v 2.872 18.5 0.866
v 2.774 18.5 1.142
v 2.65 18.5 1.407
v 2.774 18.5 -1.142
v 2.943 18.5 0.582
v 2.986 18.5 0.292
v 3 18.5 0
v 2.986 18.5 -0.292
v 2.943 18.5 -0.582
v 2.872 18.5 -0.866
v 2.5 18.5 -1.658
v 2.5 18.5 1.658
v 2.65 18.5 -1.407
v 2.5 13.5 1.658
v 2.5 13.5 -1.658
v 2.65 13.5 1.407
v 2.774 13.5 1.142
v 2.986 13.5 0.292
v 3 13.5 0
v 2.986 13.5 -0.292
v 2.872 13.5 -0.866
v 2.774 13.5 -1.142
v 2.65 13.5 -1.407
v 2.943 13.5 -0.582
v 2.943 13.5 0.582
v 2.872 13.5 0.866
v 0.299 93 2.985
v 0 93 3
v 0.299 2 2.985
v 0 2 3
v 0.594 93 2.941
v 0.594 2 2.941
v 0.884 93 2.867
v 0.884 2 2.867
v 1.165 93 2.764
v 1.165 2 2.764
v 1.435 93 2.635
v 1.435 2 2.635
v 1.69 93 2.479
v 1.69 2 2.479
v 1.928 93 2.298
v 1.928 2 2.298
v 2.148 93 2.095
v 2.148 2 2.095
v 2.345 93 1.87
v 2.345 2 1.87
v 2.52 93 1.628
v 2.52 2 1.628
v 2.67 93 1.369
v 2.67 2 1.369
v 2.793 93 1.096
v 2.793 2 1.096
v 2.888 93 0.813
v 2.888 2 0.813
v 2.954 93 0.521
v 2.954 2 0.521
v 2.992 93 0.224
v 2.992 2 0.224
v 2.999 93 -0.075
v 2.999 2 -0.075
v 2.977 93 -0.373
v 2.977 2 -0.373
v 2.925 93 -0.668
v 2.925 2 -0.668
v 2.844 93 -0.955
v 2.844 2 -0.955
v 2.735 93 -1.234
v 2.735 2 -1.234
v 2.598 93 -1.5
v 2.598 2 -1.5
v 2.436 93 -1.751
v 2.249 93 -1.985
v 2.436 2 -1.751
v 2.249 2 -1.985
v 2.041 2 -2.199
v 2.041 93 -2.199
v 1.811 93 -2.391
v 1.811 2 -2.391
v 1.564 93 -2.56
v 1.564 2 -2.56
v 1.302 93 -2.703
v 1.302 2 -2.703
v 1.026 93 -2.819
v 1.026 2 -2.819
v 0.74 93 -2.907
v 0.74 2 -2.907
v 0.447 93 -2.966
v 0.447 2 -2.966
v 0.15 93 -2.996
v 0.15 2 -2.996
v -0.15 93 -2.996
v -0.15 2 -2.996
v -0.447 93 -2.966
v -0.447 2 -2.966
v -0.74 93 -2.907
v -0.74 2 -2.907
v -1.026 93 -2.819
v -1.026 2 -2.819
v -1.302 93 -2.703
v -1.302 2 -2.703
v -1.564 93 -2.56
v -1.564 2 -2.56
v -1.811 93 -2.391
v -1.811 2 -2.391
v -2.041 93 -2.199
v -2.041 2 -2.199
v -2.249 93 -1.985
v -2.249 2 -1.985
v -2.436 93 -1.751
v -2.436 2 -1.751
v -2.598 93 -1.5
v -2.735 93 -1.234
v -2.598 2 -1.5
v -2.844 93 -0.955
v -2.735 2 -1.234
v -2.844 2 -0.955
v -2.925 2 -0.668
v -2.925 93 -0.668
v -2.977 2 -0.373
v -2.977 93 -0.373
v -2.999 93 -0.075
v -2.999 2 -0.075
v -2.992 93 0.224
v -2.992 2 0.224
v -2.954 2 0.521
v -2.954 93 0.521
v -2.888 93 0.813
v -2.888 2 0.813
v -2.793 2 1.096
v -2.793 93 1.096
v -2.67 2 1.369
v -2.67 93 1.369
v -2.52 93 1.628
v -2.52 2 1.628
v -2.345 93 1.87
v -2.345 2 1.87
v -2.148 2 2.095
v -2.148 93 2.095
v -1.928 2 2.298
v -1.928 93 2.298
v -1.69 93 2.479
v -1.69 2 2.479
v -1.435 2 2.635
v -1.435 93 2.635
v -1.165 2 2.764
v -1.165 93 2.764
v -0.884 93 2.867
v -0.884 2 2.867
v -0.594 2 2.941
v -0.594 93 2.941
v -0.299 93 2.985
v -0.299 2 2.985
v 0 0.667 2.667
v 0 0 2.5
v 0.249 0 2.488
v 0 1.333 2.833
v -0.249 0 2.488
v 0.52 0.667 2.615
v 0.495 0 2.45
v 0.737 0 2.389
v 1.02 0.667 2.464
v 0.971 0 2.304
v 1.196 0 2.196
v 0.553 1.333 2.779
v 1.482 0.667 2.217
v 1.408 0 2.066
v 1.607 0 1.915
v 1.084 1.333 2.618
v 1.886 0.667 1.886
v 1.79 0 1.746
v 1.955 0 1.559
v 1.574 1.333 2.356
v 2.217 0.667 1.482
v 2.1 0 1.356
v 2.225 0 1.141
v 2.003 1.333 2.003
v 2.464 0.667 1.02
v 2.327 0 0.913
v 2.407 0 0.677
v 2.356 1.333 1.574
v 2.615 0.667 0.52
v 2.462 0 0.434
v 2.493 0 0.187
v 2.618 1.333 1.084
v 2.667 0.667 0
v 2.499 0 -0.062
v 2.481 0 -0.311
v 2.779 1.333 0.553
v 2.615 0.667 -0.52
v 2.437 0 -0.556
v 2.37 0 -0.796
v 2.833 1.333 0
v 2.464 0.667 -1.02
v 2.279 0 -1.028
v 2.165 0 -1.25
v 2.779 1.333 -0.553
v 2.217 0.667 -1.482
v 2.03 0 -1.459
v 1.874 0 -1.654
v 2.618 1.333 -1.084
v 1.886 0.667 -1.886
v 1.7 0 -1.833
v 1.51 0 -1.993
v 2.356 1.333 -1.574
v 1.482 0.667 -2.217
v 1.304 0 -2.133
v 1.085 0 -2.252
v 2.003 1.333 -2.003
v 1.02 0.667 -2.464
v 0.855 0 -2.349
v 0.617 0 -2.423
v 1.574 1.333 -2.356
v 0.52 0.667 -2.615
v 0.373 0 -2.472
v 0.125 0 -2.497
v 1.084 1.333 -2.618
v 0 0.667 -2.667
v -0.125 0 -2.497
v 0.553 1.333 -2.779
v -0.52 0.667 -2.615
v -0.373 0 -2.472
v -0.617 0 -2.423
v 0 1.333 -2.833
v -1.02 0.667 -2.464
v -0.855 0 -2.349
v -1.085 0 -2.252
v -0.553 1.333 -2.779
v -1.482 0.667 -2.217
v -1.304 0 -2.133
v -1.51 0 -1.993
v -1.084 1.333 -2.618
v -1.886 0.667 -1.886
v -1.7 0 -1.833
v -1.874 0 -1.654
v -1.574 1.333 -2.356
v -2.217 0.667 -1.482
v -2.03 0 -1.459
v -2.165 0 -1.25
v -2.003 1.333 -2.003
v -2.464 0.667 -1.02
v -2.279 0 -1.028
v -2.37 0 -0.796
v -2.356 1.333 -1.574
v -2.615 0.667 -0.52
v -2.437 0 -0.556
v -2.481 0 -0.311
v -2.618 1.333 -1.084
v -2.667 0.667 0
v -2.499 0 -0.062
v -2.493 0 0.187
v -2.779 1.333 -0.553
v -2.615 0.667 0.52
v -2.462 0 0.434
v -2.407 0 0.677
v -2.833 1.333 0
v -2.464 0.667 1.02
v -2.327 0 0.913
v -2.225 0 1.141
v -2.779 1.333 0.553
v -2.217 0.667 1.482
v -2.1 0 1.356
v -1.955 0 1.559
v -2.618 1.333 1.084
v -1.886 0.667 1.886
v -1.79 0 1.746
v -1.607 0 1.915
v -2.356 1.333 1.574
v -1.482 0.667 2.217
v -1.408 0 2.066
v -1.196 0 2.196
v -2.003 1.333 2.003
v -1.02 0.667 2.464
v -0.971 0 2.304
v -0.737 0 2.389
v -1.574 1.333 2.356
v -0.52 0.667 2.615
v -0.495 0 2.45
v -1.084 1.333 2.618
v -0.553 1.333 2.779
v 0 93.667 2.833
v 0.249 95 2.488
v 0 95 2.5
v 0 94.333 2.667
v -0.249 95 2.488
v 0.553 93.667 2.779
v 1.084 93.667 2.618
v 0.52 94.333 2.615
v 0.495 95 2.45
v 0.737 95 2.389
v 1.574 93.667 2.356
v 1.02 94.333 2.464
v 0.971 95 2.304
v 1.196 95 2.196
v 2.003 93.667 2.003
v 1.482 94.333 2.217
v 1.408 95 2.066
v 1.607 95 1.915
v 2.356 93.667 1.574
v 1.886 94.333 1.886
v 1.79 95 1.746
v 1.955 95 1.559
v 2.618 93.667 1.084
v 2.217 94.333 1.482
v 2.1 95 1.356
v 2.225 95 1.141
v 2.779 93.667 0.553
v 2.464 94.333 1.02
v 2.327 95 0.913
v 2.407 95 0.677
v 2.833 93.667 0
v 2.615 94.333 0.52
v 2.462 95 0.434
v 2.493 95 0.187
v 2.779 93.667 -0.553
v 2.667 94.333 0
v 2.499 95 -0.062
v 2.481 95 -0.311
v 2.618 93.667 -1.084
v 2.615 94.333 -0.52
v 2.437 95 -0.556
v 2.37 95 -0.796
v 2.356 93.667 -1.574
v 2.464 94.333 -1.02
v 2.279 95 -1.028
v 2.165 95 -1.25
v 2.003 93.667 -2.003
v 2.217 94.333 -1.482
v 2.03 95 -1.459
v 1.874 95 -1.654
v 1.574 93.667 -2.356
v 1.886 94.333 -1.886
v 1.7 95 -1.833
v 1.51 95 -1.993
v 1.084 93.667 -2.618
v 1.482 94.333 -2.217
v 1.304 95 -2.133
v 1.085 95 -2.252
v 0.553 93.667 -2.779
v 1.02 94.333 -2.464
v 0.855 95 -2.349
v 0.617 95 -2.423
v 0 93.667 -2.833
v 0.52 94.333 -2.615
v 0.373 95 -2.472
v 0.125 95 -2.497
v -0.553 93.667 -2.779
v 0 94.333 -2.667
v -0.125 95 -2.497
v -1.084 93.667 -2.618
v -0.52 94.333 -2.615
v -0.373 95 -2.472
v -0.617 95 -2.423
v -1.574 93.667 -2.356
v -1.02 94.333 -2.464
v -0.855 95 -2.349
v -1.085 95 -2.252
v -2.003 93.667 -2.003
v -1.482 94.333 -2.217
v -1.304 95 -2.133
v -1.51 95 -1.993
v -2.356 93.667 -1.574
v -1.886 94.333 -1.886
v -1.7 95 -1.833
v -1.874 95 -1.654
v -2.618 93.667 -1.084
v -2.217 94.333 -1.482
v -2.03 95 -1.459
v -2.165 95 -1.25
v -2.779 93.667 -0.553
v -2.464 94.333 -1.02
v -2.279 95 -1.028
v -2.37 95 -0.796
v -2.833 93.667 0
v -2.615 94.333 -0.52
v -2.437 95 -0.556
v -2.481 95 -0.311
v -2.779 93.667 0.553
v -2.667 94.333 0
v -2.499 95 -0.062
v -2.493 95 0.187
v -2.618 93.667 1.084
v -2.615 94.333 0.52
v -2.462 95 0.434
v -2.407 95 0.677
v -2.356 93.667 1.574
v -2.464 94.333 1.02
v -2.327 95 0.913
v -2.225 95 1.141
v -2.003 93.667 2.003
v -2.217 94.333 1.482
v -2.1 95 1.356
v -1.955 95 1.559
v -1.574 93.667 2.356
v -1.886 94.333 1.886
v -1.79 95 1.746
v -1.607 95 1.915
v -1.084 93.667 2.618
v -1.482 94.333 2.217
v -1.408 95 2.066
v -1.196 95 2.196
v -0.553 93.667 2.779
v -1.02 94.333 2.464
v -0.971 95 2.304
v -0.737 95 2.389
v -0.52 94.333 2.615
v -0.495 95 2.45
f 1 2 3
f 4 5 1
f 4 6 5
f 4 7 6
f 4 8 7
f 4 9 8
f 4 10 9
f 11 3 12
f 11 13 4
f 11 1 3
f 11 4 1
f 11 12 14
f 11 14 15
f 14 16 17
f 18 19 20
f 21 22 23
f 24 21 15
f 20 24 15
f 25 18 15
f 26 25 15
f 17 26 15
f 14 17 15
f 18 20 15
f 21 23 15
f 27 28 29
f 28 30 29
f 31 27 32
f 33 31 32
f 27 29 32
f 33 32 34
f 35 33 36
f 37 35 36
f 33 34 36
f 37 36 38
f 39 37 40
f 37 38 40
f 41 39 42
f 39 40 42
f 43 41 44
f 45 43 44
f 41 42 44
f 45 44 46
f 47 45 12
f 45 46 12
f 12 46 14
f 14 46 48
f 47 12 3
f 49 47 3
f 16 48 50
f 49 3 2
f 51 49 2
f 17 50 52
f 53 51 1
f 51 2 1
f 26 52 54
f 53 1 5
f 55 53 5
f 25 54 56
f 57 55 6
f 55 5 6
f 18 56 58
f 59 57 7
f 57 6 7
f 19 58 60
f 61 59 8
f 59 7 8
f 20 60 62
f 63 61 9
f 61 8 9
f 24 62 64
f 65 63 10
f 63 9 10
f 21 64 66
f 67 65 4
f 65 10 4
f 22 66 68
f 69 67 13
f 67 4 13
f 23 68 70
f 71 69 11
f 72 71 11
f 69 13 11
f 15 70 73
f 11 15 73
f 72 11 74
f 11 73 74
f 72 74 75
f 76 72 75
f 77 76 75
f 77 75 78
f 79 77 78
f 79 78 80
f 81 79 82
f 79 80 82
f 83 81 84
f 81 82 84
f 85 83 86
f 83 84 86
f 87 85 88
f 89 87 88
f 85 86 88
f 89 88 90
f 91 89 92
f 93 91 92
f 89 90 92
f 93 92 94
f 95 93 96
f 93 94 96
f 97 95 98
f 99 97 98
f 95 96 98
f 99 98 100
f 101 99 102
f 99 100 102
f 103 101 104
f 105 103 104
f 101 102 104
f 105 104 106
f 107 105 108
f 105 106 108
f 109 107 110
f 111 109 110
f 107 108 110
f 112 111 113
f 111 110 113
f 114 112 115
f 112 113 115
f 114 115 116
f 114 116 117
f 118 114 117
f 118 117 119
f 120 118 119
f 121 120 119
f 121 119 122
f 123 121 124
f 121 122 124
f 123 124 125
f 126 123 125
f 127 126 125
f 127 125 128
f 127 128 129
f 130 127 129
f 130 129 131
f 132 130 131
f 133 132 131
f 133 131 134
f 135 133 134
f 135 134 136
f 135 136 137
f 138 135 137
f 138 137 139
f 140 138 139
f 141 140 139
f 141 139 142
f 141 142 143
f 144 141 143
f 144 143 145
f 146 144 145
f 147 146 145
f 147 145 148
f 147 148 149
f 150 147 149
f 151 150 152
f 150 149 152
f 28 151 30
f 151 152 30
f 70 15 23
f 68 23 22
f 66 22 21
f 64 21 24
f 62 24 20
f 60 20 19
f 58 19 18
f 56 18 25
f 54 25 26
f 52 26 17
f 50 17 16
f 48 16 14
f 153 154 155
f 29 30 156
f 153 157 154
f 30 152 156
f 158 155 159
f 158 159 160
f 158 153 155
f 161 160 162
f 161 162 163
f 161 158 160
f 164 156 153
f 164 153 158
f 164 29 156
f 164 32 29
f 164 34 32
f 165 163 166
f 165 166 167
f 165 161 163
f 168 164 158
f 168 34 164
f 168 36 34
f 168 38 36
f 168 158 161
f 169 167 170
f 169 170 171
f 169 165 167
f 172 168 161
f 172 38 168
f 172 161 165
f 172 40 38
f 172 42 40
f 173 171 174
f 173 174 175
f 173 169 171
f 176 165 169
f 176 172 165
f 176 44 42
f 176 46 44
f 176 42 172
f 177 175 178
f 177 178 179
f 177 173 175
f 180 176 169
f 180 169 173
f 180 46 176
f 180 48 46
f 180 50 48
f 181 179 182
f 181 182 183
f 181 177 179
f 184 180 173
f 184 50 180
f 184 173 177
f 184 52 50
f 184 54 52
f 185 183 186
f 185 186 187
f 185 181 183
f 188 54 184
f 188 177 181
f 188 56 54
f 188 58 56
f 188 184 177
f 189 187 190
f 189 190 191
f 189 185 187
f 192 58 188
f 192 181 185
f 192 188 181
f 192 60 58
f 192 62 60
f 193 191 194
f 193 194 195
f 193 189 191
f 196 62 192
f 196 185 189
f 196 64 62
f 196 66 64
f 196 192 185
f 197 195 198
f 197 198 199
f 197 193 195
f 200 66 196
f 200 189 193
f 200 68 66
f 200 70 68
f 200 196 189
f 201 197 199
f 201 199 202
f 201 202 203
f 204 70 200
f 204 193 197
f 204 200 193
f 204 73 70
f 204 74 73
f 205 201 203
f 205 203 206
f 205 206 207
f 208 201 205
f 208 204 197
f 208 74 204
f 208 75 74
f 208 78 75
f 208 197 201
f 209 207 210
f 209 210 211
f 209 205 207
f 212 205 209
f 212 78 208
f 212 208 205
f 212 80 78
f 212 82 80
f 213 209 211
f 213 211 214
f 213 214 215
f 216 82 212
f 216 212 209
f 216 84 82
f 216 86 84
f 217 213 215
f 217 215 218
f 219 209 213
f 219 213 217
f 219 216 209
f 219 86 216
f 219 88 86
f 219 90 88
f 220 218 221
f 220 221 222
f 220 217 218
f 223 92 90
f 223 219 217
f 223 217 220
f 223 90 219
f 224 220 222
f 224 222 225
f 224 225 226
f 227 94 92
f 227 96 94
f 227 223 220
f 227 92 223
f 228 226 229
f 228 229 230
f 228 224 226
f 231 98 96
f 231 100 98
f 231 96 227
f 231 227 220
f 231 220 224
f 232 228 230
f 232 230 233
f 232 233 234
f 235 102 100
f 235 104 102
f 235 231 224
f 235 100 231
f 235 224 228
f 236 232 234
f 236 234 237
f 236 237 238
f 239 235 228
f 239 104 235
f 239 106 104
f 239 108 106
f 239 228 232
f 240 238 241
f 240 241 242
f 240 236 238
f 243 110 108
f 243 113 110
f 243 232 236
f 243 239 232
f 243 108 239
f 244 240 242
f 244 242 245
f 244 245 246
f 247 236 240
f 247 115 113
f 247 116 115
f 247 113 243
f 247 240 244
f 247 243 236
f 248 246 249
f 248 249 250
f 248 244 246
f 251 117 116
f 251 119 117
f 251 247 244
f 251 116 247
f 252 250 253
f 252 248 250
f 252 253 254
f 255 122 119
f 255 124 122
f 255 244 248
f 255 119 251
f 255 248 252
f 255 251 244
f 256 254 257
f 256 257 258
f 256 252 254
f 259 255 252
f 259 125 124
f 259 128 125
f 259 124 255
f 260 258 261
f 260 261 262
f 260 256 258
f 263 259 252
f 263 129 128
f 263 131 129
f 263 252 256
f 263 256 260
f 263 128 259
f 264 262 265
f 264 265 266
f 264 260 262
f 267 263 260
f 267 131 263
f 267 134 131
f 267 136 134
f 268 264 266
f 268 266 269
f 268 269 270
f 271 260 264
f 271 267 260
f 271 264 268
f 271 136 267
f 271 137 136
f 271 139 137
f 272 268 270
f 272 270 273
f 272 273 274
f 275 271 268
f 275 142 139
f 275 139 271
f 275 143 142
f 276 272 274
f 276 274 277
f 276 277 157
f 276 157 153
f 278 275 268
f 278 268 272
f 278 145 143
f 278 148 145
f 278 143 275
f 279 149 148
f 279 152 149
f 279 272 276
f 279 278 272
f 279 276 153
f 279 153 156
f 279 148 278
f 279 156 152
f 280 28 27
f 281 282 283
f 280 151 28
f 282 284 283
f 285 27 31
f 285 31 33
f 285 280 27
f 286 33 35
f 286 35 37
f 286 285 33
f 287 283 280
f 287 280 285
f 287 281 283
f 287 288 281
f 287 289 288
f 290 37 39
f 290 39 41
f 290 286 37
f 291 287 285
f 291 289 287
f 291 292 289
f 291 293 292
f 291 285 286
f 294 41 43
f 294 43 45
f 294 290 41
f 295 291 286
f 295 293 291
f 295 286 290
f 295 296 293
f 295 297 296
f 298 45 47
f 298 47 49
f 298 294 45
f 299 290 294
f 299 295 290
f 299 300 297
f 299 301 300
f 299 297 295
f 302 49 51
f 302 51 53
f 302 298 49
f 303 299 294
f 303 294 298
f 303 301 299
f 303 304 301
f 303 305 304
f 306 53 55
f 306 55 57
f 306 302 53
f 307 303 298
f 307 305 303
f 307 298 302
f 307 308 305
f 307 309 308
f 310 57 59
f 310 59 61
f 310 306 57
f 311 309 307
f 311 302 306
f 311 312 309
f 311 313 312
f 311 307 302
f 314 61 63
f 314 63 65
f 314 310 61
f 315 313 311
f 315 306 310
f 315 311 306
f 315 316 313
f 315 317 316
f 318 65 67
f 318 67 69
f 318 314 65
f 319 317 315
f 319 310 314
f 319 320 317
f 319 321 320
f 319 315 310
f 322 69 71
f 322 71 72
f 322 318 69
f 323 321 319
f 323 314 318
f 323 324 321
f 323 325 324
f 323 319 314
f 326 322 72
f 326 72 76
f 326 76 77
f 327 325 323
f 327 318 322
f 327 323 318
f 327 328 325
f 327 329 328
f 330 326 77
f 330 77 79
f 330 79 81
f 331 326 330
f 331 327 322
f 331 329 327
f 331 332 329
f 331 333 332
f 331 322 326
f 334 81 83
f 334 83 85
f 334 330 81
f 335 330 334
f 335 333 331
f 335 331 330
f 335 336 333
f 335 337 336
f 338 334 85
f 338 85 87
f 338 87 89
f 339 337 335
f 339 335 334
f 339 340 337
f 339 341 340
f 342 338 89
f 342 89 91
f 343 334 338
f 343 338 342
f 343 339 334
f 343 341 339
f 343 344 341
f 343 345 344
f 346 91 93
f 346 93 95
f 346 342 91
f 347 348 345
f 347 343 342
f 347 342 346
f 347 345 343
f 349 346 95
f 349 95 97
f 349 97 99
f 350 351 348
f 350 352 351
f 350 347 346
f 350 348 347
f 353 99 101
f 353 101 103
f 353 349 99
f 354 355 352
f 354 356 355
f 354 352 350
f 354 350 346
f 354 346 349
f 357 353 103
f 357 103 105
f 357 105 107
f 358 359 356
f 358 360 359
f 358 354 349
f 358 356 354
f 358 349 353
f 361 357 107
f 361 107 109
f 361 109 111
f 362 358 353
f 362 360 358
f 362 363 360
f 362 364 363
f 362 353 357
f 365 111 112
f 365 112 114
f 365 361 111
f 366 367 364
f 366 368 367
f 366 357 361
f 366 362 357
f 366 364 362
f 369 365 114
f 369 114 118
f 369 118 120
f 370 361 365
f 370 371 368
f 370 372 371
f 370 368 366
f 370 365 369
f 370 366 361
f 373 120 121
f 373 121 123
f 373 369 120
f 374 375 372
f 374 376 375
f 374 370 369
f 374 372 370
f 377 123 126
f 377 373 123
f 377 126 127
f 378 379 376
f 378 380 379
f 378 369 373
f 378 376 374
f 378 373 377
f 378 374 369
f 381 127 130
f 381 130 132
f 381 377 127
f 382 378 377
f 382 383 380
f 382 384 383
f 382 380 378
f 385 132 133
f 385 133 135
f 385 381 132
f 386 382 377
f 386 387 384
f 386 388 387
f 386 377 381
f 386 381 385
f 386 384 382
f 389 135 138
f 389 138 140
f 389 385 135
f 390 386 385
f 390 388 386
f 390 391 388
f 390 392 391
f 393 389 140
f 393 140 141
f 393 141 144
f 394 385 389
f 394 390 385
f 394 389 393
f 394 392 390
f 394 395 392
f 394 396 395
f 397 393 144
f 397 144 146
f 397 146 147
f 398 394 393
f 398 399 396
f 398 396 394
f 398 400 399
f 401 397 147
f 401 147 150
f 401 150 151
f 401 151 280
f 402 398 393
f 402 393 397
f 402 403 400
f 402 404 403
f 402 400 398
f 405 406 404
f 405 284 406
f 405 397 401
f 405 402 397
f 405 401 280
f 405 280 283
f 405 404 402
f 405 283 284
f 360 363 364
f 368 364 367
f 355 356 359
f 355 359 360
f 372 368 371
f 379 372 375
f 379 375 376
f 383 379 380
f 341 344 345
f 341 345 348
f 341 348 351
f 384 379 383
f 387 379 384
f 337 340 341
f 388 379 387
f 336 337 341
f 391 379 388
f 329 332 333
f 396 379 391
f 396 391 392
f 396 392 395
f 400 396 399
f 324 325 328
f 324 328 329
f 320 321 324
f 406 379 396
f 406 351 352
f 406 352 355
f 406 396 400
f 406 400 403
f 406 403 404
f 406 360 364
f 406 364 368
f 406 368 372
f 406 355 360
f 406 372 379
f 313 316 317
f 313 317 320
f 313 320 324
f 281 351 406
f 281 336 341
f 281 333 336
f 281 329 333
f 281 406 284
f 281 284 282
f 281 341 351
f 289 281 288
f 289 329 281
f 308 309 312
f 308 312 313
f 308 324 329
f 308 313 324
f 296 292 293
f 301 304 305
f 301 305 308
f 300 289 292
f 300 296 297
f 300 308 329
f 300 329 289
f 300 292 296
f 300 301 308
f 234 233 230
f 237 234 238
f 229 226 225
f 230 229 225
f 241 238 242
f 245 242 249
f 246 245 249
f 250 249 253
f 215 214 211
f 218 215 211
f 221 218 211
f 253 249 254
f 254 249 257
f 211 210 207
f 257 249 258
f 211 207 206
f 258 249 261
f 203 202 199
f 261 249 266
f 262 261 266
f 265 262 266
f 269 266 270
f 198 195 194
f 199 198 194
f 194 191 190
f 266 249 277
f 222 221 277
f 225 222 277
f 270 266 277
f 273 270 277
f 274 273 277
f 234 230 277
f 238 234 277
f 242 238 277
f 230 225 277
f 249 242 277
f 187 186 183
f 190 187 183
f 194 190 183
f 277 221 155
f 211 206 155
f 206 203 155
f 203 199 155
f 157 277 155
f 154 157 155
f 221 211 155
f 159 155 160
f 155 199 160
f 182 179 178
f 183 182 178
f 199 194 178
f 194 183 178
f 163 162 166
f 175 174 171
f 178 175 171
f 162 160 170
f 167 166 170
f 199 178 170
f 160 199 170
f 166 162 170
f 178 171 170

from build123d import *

# Parameters (mm, degrees)
SKETCH1_R           = 3
BOSS_EXTRUDE1_DEPTH = 95
CHAMFER1_SIZE       = 0.5
CHAMFER1_SIZE2      = 2
CHAMFER2_SIZE       = 2
CHAMFER2_SIZE2      = 0.5
SKETCH2_W           = 6
SKETCH2_H           = 5
CUT_EXTRUDE1_DEPTH  = 0.5


with BuildPart() as part:
    # Sketch1 → Boss-Extrude1 (new body)
    with BuildSketch(Plane(origin=(0, 0, 0), x_dir=(1, 0, 0), z_dir=(0, 1, 0))):
        with Locations(Location((0, 0, 0), (0, 0, 270))):
            Circle(SKETCH1_R)
    extrude(amount=BOSS_EXTRUDE1_DEPTH)

    # Chamfer1
    chamfer1_edges = [part.edges().sort_by_distance(p)[0] for p in [
        (0, 0, -3),
    ]]
    chamfer1_side = [part.faces().sort_by_distance(p)[0] for p in [
        (0, 0, 0),
    ]]
    chamfer(chamfer1_edges, length=CHAMFER1_SIZE, length2=CHAMFER1_SIZE2, reference=chamfer1_side[0])

    # Chamfer2
    chamfer2_edges = [part.edges().sort_by_distance(p)[0] for p in [
        (0, 95, -3),
    ]]
    chamfer2_side = [part.faces().sort_by_distance(p)[0] for p in [
        (0, 48.5, -3),
    ]]
    chamfer(chamfer2_edges, length=CHAMFER2_SIZE, length2=CHAMFER2_SIZE2, reference=chamfer2_side[0])

    # Sketch2 → Cut-Extrude1 (cut)
    with BuildSketch(Plane(origin=(3, 0, 0), x_dir=(0, 0, -1), z_dir=(1, 0, 0))):
        with Locations((0, 16)):
            Rectangle(SKETCH2_W, SKETCH2_H)
    extrude(amount=-CUT_EXTRUDE1_DEPTH, mode=Mode.SUBTRACT)


solid = part.part
